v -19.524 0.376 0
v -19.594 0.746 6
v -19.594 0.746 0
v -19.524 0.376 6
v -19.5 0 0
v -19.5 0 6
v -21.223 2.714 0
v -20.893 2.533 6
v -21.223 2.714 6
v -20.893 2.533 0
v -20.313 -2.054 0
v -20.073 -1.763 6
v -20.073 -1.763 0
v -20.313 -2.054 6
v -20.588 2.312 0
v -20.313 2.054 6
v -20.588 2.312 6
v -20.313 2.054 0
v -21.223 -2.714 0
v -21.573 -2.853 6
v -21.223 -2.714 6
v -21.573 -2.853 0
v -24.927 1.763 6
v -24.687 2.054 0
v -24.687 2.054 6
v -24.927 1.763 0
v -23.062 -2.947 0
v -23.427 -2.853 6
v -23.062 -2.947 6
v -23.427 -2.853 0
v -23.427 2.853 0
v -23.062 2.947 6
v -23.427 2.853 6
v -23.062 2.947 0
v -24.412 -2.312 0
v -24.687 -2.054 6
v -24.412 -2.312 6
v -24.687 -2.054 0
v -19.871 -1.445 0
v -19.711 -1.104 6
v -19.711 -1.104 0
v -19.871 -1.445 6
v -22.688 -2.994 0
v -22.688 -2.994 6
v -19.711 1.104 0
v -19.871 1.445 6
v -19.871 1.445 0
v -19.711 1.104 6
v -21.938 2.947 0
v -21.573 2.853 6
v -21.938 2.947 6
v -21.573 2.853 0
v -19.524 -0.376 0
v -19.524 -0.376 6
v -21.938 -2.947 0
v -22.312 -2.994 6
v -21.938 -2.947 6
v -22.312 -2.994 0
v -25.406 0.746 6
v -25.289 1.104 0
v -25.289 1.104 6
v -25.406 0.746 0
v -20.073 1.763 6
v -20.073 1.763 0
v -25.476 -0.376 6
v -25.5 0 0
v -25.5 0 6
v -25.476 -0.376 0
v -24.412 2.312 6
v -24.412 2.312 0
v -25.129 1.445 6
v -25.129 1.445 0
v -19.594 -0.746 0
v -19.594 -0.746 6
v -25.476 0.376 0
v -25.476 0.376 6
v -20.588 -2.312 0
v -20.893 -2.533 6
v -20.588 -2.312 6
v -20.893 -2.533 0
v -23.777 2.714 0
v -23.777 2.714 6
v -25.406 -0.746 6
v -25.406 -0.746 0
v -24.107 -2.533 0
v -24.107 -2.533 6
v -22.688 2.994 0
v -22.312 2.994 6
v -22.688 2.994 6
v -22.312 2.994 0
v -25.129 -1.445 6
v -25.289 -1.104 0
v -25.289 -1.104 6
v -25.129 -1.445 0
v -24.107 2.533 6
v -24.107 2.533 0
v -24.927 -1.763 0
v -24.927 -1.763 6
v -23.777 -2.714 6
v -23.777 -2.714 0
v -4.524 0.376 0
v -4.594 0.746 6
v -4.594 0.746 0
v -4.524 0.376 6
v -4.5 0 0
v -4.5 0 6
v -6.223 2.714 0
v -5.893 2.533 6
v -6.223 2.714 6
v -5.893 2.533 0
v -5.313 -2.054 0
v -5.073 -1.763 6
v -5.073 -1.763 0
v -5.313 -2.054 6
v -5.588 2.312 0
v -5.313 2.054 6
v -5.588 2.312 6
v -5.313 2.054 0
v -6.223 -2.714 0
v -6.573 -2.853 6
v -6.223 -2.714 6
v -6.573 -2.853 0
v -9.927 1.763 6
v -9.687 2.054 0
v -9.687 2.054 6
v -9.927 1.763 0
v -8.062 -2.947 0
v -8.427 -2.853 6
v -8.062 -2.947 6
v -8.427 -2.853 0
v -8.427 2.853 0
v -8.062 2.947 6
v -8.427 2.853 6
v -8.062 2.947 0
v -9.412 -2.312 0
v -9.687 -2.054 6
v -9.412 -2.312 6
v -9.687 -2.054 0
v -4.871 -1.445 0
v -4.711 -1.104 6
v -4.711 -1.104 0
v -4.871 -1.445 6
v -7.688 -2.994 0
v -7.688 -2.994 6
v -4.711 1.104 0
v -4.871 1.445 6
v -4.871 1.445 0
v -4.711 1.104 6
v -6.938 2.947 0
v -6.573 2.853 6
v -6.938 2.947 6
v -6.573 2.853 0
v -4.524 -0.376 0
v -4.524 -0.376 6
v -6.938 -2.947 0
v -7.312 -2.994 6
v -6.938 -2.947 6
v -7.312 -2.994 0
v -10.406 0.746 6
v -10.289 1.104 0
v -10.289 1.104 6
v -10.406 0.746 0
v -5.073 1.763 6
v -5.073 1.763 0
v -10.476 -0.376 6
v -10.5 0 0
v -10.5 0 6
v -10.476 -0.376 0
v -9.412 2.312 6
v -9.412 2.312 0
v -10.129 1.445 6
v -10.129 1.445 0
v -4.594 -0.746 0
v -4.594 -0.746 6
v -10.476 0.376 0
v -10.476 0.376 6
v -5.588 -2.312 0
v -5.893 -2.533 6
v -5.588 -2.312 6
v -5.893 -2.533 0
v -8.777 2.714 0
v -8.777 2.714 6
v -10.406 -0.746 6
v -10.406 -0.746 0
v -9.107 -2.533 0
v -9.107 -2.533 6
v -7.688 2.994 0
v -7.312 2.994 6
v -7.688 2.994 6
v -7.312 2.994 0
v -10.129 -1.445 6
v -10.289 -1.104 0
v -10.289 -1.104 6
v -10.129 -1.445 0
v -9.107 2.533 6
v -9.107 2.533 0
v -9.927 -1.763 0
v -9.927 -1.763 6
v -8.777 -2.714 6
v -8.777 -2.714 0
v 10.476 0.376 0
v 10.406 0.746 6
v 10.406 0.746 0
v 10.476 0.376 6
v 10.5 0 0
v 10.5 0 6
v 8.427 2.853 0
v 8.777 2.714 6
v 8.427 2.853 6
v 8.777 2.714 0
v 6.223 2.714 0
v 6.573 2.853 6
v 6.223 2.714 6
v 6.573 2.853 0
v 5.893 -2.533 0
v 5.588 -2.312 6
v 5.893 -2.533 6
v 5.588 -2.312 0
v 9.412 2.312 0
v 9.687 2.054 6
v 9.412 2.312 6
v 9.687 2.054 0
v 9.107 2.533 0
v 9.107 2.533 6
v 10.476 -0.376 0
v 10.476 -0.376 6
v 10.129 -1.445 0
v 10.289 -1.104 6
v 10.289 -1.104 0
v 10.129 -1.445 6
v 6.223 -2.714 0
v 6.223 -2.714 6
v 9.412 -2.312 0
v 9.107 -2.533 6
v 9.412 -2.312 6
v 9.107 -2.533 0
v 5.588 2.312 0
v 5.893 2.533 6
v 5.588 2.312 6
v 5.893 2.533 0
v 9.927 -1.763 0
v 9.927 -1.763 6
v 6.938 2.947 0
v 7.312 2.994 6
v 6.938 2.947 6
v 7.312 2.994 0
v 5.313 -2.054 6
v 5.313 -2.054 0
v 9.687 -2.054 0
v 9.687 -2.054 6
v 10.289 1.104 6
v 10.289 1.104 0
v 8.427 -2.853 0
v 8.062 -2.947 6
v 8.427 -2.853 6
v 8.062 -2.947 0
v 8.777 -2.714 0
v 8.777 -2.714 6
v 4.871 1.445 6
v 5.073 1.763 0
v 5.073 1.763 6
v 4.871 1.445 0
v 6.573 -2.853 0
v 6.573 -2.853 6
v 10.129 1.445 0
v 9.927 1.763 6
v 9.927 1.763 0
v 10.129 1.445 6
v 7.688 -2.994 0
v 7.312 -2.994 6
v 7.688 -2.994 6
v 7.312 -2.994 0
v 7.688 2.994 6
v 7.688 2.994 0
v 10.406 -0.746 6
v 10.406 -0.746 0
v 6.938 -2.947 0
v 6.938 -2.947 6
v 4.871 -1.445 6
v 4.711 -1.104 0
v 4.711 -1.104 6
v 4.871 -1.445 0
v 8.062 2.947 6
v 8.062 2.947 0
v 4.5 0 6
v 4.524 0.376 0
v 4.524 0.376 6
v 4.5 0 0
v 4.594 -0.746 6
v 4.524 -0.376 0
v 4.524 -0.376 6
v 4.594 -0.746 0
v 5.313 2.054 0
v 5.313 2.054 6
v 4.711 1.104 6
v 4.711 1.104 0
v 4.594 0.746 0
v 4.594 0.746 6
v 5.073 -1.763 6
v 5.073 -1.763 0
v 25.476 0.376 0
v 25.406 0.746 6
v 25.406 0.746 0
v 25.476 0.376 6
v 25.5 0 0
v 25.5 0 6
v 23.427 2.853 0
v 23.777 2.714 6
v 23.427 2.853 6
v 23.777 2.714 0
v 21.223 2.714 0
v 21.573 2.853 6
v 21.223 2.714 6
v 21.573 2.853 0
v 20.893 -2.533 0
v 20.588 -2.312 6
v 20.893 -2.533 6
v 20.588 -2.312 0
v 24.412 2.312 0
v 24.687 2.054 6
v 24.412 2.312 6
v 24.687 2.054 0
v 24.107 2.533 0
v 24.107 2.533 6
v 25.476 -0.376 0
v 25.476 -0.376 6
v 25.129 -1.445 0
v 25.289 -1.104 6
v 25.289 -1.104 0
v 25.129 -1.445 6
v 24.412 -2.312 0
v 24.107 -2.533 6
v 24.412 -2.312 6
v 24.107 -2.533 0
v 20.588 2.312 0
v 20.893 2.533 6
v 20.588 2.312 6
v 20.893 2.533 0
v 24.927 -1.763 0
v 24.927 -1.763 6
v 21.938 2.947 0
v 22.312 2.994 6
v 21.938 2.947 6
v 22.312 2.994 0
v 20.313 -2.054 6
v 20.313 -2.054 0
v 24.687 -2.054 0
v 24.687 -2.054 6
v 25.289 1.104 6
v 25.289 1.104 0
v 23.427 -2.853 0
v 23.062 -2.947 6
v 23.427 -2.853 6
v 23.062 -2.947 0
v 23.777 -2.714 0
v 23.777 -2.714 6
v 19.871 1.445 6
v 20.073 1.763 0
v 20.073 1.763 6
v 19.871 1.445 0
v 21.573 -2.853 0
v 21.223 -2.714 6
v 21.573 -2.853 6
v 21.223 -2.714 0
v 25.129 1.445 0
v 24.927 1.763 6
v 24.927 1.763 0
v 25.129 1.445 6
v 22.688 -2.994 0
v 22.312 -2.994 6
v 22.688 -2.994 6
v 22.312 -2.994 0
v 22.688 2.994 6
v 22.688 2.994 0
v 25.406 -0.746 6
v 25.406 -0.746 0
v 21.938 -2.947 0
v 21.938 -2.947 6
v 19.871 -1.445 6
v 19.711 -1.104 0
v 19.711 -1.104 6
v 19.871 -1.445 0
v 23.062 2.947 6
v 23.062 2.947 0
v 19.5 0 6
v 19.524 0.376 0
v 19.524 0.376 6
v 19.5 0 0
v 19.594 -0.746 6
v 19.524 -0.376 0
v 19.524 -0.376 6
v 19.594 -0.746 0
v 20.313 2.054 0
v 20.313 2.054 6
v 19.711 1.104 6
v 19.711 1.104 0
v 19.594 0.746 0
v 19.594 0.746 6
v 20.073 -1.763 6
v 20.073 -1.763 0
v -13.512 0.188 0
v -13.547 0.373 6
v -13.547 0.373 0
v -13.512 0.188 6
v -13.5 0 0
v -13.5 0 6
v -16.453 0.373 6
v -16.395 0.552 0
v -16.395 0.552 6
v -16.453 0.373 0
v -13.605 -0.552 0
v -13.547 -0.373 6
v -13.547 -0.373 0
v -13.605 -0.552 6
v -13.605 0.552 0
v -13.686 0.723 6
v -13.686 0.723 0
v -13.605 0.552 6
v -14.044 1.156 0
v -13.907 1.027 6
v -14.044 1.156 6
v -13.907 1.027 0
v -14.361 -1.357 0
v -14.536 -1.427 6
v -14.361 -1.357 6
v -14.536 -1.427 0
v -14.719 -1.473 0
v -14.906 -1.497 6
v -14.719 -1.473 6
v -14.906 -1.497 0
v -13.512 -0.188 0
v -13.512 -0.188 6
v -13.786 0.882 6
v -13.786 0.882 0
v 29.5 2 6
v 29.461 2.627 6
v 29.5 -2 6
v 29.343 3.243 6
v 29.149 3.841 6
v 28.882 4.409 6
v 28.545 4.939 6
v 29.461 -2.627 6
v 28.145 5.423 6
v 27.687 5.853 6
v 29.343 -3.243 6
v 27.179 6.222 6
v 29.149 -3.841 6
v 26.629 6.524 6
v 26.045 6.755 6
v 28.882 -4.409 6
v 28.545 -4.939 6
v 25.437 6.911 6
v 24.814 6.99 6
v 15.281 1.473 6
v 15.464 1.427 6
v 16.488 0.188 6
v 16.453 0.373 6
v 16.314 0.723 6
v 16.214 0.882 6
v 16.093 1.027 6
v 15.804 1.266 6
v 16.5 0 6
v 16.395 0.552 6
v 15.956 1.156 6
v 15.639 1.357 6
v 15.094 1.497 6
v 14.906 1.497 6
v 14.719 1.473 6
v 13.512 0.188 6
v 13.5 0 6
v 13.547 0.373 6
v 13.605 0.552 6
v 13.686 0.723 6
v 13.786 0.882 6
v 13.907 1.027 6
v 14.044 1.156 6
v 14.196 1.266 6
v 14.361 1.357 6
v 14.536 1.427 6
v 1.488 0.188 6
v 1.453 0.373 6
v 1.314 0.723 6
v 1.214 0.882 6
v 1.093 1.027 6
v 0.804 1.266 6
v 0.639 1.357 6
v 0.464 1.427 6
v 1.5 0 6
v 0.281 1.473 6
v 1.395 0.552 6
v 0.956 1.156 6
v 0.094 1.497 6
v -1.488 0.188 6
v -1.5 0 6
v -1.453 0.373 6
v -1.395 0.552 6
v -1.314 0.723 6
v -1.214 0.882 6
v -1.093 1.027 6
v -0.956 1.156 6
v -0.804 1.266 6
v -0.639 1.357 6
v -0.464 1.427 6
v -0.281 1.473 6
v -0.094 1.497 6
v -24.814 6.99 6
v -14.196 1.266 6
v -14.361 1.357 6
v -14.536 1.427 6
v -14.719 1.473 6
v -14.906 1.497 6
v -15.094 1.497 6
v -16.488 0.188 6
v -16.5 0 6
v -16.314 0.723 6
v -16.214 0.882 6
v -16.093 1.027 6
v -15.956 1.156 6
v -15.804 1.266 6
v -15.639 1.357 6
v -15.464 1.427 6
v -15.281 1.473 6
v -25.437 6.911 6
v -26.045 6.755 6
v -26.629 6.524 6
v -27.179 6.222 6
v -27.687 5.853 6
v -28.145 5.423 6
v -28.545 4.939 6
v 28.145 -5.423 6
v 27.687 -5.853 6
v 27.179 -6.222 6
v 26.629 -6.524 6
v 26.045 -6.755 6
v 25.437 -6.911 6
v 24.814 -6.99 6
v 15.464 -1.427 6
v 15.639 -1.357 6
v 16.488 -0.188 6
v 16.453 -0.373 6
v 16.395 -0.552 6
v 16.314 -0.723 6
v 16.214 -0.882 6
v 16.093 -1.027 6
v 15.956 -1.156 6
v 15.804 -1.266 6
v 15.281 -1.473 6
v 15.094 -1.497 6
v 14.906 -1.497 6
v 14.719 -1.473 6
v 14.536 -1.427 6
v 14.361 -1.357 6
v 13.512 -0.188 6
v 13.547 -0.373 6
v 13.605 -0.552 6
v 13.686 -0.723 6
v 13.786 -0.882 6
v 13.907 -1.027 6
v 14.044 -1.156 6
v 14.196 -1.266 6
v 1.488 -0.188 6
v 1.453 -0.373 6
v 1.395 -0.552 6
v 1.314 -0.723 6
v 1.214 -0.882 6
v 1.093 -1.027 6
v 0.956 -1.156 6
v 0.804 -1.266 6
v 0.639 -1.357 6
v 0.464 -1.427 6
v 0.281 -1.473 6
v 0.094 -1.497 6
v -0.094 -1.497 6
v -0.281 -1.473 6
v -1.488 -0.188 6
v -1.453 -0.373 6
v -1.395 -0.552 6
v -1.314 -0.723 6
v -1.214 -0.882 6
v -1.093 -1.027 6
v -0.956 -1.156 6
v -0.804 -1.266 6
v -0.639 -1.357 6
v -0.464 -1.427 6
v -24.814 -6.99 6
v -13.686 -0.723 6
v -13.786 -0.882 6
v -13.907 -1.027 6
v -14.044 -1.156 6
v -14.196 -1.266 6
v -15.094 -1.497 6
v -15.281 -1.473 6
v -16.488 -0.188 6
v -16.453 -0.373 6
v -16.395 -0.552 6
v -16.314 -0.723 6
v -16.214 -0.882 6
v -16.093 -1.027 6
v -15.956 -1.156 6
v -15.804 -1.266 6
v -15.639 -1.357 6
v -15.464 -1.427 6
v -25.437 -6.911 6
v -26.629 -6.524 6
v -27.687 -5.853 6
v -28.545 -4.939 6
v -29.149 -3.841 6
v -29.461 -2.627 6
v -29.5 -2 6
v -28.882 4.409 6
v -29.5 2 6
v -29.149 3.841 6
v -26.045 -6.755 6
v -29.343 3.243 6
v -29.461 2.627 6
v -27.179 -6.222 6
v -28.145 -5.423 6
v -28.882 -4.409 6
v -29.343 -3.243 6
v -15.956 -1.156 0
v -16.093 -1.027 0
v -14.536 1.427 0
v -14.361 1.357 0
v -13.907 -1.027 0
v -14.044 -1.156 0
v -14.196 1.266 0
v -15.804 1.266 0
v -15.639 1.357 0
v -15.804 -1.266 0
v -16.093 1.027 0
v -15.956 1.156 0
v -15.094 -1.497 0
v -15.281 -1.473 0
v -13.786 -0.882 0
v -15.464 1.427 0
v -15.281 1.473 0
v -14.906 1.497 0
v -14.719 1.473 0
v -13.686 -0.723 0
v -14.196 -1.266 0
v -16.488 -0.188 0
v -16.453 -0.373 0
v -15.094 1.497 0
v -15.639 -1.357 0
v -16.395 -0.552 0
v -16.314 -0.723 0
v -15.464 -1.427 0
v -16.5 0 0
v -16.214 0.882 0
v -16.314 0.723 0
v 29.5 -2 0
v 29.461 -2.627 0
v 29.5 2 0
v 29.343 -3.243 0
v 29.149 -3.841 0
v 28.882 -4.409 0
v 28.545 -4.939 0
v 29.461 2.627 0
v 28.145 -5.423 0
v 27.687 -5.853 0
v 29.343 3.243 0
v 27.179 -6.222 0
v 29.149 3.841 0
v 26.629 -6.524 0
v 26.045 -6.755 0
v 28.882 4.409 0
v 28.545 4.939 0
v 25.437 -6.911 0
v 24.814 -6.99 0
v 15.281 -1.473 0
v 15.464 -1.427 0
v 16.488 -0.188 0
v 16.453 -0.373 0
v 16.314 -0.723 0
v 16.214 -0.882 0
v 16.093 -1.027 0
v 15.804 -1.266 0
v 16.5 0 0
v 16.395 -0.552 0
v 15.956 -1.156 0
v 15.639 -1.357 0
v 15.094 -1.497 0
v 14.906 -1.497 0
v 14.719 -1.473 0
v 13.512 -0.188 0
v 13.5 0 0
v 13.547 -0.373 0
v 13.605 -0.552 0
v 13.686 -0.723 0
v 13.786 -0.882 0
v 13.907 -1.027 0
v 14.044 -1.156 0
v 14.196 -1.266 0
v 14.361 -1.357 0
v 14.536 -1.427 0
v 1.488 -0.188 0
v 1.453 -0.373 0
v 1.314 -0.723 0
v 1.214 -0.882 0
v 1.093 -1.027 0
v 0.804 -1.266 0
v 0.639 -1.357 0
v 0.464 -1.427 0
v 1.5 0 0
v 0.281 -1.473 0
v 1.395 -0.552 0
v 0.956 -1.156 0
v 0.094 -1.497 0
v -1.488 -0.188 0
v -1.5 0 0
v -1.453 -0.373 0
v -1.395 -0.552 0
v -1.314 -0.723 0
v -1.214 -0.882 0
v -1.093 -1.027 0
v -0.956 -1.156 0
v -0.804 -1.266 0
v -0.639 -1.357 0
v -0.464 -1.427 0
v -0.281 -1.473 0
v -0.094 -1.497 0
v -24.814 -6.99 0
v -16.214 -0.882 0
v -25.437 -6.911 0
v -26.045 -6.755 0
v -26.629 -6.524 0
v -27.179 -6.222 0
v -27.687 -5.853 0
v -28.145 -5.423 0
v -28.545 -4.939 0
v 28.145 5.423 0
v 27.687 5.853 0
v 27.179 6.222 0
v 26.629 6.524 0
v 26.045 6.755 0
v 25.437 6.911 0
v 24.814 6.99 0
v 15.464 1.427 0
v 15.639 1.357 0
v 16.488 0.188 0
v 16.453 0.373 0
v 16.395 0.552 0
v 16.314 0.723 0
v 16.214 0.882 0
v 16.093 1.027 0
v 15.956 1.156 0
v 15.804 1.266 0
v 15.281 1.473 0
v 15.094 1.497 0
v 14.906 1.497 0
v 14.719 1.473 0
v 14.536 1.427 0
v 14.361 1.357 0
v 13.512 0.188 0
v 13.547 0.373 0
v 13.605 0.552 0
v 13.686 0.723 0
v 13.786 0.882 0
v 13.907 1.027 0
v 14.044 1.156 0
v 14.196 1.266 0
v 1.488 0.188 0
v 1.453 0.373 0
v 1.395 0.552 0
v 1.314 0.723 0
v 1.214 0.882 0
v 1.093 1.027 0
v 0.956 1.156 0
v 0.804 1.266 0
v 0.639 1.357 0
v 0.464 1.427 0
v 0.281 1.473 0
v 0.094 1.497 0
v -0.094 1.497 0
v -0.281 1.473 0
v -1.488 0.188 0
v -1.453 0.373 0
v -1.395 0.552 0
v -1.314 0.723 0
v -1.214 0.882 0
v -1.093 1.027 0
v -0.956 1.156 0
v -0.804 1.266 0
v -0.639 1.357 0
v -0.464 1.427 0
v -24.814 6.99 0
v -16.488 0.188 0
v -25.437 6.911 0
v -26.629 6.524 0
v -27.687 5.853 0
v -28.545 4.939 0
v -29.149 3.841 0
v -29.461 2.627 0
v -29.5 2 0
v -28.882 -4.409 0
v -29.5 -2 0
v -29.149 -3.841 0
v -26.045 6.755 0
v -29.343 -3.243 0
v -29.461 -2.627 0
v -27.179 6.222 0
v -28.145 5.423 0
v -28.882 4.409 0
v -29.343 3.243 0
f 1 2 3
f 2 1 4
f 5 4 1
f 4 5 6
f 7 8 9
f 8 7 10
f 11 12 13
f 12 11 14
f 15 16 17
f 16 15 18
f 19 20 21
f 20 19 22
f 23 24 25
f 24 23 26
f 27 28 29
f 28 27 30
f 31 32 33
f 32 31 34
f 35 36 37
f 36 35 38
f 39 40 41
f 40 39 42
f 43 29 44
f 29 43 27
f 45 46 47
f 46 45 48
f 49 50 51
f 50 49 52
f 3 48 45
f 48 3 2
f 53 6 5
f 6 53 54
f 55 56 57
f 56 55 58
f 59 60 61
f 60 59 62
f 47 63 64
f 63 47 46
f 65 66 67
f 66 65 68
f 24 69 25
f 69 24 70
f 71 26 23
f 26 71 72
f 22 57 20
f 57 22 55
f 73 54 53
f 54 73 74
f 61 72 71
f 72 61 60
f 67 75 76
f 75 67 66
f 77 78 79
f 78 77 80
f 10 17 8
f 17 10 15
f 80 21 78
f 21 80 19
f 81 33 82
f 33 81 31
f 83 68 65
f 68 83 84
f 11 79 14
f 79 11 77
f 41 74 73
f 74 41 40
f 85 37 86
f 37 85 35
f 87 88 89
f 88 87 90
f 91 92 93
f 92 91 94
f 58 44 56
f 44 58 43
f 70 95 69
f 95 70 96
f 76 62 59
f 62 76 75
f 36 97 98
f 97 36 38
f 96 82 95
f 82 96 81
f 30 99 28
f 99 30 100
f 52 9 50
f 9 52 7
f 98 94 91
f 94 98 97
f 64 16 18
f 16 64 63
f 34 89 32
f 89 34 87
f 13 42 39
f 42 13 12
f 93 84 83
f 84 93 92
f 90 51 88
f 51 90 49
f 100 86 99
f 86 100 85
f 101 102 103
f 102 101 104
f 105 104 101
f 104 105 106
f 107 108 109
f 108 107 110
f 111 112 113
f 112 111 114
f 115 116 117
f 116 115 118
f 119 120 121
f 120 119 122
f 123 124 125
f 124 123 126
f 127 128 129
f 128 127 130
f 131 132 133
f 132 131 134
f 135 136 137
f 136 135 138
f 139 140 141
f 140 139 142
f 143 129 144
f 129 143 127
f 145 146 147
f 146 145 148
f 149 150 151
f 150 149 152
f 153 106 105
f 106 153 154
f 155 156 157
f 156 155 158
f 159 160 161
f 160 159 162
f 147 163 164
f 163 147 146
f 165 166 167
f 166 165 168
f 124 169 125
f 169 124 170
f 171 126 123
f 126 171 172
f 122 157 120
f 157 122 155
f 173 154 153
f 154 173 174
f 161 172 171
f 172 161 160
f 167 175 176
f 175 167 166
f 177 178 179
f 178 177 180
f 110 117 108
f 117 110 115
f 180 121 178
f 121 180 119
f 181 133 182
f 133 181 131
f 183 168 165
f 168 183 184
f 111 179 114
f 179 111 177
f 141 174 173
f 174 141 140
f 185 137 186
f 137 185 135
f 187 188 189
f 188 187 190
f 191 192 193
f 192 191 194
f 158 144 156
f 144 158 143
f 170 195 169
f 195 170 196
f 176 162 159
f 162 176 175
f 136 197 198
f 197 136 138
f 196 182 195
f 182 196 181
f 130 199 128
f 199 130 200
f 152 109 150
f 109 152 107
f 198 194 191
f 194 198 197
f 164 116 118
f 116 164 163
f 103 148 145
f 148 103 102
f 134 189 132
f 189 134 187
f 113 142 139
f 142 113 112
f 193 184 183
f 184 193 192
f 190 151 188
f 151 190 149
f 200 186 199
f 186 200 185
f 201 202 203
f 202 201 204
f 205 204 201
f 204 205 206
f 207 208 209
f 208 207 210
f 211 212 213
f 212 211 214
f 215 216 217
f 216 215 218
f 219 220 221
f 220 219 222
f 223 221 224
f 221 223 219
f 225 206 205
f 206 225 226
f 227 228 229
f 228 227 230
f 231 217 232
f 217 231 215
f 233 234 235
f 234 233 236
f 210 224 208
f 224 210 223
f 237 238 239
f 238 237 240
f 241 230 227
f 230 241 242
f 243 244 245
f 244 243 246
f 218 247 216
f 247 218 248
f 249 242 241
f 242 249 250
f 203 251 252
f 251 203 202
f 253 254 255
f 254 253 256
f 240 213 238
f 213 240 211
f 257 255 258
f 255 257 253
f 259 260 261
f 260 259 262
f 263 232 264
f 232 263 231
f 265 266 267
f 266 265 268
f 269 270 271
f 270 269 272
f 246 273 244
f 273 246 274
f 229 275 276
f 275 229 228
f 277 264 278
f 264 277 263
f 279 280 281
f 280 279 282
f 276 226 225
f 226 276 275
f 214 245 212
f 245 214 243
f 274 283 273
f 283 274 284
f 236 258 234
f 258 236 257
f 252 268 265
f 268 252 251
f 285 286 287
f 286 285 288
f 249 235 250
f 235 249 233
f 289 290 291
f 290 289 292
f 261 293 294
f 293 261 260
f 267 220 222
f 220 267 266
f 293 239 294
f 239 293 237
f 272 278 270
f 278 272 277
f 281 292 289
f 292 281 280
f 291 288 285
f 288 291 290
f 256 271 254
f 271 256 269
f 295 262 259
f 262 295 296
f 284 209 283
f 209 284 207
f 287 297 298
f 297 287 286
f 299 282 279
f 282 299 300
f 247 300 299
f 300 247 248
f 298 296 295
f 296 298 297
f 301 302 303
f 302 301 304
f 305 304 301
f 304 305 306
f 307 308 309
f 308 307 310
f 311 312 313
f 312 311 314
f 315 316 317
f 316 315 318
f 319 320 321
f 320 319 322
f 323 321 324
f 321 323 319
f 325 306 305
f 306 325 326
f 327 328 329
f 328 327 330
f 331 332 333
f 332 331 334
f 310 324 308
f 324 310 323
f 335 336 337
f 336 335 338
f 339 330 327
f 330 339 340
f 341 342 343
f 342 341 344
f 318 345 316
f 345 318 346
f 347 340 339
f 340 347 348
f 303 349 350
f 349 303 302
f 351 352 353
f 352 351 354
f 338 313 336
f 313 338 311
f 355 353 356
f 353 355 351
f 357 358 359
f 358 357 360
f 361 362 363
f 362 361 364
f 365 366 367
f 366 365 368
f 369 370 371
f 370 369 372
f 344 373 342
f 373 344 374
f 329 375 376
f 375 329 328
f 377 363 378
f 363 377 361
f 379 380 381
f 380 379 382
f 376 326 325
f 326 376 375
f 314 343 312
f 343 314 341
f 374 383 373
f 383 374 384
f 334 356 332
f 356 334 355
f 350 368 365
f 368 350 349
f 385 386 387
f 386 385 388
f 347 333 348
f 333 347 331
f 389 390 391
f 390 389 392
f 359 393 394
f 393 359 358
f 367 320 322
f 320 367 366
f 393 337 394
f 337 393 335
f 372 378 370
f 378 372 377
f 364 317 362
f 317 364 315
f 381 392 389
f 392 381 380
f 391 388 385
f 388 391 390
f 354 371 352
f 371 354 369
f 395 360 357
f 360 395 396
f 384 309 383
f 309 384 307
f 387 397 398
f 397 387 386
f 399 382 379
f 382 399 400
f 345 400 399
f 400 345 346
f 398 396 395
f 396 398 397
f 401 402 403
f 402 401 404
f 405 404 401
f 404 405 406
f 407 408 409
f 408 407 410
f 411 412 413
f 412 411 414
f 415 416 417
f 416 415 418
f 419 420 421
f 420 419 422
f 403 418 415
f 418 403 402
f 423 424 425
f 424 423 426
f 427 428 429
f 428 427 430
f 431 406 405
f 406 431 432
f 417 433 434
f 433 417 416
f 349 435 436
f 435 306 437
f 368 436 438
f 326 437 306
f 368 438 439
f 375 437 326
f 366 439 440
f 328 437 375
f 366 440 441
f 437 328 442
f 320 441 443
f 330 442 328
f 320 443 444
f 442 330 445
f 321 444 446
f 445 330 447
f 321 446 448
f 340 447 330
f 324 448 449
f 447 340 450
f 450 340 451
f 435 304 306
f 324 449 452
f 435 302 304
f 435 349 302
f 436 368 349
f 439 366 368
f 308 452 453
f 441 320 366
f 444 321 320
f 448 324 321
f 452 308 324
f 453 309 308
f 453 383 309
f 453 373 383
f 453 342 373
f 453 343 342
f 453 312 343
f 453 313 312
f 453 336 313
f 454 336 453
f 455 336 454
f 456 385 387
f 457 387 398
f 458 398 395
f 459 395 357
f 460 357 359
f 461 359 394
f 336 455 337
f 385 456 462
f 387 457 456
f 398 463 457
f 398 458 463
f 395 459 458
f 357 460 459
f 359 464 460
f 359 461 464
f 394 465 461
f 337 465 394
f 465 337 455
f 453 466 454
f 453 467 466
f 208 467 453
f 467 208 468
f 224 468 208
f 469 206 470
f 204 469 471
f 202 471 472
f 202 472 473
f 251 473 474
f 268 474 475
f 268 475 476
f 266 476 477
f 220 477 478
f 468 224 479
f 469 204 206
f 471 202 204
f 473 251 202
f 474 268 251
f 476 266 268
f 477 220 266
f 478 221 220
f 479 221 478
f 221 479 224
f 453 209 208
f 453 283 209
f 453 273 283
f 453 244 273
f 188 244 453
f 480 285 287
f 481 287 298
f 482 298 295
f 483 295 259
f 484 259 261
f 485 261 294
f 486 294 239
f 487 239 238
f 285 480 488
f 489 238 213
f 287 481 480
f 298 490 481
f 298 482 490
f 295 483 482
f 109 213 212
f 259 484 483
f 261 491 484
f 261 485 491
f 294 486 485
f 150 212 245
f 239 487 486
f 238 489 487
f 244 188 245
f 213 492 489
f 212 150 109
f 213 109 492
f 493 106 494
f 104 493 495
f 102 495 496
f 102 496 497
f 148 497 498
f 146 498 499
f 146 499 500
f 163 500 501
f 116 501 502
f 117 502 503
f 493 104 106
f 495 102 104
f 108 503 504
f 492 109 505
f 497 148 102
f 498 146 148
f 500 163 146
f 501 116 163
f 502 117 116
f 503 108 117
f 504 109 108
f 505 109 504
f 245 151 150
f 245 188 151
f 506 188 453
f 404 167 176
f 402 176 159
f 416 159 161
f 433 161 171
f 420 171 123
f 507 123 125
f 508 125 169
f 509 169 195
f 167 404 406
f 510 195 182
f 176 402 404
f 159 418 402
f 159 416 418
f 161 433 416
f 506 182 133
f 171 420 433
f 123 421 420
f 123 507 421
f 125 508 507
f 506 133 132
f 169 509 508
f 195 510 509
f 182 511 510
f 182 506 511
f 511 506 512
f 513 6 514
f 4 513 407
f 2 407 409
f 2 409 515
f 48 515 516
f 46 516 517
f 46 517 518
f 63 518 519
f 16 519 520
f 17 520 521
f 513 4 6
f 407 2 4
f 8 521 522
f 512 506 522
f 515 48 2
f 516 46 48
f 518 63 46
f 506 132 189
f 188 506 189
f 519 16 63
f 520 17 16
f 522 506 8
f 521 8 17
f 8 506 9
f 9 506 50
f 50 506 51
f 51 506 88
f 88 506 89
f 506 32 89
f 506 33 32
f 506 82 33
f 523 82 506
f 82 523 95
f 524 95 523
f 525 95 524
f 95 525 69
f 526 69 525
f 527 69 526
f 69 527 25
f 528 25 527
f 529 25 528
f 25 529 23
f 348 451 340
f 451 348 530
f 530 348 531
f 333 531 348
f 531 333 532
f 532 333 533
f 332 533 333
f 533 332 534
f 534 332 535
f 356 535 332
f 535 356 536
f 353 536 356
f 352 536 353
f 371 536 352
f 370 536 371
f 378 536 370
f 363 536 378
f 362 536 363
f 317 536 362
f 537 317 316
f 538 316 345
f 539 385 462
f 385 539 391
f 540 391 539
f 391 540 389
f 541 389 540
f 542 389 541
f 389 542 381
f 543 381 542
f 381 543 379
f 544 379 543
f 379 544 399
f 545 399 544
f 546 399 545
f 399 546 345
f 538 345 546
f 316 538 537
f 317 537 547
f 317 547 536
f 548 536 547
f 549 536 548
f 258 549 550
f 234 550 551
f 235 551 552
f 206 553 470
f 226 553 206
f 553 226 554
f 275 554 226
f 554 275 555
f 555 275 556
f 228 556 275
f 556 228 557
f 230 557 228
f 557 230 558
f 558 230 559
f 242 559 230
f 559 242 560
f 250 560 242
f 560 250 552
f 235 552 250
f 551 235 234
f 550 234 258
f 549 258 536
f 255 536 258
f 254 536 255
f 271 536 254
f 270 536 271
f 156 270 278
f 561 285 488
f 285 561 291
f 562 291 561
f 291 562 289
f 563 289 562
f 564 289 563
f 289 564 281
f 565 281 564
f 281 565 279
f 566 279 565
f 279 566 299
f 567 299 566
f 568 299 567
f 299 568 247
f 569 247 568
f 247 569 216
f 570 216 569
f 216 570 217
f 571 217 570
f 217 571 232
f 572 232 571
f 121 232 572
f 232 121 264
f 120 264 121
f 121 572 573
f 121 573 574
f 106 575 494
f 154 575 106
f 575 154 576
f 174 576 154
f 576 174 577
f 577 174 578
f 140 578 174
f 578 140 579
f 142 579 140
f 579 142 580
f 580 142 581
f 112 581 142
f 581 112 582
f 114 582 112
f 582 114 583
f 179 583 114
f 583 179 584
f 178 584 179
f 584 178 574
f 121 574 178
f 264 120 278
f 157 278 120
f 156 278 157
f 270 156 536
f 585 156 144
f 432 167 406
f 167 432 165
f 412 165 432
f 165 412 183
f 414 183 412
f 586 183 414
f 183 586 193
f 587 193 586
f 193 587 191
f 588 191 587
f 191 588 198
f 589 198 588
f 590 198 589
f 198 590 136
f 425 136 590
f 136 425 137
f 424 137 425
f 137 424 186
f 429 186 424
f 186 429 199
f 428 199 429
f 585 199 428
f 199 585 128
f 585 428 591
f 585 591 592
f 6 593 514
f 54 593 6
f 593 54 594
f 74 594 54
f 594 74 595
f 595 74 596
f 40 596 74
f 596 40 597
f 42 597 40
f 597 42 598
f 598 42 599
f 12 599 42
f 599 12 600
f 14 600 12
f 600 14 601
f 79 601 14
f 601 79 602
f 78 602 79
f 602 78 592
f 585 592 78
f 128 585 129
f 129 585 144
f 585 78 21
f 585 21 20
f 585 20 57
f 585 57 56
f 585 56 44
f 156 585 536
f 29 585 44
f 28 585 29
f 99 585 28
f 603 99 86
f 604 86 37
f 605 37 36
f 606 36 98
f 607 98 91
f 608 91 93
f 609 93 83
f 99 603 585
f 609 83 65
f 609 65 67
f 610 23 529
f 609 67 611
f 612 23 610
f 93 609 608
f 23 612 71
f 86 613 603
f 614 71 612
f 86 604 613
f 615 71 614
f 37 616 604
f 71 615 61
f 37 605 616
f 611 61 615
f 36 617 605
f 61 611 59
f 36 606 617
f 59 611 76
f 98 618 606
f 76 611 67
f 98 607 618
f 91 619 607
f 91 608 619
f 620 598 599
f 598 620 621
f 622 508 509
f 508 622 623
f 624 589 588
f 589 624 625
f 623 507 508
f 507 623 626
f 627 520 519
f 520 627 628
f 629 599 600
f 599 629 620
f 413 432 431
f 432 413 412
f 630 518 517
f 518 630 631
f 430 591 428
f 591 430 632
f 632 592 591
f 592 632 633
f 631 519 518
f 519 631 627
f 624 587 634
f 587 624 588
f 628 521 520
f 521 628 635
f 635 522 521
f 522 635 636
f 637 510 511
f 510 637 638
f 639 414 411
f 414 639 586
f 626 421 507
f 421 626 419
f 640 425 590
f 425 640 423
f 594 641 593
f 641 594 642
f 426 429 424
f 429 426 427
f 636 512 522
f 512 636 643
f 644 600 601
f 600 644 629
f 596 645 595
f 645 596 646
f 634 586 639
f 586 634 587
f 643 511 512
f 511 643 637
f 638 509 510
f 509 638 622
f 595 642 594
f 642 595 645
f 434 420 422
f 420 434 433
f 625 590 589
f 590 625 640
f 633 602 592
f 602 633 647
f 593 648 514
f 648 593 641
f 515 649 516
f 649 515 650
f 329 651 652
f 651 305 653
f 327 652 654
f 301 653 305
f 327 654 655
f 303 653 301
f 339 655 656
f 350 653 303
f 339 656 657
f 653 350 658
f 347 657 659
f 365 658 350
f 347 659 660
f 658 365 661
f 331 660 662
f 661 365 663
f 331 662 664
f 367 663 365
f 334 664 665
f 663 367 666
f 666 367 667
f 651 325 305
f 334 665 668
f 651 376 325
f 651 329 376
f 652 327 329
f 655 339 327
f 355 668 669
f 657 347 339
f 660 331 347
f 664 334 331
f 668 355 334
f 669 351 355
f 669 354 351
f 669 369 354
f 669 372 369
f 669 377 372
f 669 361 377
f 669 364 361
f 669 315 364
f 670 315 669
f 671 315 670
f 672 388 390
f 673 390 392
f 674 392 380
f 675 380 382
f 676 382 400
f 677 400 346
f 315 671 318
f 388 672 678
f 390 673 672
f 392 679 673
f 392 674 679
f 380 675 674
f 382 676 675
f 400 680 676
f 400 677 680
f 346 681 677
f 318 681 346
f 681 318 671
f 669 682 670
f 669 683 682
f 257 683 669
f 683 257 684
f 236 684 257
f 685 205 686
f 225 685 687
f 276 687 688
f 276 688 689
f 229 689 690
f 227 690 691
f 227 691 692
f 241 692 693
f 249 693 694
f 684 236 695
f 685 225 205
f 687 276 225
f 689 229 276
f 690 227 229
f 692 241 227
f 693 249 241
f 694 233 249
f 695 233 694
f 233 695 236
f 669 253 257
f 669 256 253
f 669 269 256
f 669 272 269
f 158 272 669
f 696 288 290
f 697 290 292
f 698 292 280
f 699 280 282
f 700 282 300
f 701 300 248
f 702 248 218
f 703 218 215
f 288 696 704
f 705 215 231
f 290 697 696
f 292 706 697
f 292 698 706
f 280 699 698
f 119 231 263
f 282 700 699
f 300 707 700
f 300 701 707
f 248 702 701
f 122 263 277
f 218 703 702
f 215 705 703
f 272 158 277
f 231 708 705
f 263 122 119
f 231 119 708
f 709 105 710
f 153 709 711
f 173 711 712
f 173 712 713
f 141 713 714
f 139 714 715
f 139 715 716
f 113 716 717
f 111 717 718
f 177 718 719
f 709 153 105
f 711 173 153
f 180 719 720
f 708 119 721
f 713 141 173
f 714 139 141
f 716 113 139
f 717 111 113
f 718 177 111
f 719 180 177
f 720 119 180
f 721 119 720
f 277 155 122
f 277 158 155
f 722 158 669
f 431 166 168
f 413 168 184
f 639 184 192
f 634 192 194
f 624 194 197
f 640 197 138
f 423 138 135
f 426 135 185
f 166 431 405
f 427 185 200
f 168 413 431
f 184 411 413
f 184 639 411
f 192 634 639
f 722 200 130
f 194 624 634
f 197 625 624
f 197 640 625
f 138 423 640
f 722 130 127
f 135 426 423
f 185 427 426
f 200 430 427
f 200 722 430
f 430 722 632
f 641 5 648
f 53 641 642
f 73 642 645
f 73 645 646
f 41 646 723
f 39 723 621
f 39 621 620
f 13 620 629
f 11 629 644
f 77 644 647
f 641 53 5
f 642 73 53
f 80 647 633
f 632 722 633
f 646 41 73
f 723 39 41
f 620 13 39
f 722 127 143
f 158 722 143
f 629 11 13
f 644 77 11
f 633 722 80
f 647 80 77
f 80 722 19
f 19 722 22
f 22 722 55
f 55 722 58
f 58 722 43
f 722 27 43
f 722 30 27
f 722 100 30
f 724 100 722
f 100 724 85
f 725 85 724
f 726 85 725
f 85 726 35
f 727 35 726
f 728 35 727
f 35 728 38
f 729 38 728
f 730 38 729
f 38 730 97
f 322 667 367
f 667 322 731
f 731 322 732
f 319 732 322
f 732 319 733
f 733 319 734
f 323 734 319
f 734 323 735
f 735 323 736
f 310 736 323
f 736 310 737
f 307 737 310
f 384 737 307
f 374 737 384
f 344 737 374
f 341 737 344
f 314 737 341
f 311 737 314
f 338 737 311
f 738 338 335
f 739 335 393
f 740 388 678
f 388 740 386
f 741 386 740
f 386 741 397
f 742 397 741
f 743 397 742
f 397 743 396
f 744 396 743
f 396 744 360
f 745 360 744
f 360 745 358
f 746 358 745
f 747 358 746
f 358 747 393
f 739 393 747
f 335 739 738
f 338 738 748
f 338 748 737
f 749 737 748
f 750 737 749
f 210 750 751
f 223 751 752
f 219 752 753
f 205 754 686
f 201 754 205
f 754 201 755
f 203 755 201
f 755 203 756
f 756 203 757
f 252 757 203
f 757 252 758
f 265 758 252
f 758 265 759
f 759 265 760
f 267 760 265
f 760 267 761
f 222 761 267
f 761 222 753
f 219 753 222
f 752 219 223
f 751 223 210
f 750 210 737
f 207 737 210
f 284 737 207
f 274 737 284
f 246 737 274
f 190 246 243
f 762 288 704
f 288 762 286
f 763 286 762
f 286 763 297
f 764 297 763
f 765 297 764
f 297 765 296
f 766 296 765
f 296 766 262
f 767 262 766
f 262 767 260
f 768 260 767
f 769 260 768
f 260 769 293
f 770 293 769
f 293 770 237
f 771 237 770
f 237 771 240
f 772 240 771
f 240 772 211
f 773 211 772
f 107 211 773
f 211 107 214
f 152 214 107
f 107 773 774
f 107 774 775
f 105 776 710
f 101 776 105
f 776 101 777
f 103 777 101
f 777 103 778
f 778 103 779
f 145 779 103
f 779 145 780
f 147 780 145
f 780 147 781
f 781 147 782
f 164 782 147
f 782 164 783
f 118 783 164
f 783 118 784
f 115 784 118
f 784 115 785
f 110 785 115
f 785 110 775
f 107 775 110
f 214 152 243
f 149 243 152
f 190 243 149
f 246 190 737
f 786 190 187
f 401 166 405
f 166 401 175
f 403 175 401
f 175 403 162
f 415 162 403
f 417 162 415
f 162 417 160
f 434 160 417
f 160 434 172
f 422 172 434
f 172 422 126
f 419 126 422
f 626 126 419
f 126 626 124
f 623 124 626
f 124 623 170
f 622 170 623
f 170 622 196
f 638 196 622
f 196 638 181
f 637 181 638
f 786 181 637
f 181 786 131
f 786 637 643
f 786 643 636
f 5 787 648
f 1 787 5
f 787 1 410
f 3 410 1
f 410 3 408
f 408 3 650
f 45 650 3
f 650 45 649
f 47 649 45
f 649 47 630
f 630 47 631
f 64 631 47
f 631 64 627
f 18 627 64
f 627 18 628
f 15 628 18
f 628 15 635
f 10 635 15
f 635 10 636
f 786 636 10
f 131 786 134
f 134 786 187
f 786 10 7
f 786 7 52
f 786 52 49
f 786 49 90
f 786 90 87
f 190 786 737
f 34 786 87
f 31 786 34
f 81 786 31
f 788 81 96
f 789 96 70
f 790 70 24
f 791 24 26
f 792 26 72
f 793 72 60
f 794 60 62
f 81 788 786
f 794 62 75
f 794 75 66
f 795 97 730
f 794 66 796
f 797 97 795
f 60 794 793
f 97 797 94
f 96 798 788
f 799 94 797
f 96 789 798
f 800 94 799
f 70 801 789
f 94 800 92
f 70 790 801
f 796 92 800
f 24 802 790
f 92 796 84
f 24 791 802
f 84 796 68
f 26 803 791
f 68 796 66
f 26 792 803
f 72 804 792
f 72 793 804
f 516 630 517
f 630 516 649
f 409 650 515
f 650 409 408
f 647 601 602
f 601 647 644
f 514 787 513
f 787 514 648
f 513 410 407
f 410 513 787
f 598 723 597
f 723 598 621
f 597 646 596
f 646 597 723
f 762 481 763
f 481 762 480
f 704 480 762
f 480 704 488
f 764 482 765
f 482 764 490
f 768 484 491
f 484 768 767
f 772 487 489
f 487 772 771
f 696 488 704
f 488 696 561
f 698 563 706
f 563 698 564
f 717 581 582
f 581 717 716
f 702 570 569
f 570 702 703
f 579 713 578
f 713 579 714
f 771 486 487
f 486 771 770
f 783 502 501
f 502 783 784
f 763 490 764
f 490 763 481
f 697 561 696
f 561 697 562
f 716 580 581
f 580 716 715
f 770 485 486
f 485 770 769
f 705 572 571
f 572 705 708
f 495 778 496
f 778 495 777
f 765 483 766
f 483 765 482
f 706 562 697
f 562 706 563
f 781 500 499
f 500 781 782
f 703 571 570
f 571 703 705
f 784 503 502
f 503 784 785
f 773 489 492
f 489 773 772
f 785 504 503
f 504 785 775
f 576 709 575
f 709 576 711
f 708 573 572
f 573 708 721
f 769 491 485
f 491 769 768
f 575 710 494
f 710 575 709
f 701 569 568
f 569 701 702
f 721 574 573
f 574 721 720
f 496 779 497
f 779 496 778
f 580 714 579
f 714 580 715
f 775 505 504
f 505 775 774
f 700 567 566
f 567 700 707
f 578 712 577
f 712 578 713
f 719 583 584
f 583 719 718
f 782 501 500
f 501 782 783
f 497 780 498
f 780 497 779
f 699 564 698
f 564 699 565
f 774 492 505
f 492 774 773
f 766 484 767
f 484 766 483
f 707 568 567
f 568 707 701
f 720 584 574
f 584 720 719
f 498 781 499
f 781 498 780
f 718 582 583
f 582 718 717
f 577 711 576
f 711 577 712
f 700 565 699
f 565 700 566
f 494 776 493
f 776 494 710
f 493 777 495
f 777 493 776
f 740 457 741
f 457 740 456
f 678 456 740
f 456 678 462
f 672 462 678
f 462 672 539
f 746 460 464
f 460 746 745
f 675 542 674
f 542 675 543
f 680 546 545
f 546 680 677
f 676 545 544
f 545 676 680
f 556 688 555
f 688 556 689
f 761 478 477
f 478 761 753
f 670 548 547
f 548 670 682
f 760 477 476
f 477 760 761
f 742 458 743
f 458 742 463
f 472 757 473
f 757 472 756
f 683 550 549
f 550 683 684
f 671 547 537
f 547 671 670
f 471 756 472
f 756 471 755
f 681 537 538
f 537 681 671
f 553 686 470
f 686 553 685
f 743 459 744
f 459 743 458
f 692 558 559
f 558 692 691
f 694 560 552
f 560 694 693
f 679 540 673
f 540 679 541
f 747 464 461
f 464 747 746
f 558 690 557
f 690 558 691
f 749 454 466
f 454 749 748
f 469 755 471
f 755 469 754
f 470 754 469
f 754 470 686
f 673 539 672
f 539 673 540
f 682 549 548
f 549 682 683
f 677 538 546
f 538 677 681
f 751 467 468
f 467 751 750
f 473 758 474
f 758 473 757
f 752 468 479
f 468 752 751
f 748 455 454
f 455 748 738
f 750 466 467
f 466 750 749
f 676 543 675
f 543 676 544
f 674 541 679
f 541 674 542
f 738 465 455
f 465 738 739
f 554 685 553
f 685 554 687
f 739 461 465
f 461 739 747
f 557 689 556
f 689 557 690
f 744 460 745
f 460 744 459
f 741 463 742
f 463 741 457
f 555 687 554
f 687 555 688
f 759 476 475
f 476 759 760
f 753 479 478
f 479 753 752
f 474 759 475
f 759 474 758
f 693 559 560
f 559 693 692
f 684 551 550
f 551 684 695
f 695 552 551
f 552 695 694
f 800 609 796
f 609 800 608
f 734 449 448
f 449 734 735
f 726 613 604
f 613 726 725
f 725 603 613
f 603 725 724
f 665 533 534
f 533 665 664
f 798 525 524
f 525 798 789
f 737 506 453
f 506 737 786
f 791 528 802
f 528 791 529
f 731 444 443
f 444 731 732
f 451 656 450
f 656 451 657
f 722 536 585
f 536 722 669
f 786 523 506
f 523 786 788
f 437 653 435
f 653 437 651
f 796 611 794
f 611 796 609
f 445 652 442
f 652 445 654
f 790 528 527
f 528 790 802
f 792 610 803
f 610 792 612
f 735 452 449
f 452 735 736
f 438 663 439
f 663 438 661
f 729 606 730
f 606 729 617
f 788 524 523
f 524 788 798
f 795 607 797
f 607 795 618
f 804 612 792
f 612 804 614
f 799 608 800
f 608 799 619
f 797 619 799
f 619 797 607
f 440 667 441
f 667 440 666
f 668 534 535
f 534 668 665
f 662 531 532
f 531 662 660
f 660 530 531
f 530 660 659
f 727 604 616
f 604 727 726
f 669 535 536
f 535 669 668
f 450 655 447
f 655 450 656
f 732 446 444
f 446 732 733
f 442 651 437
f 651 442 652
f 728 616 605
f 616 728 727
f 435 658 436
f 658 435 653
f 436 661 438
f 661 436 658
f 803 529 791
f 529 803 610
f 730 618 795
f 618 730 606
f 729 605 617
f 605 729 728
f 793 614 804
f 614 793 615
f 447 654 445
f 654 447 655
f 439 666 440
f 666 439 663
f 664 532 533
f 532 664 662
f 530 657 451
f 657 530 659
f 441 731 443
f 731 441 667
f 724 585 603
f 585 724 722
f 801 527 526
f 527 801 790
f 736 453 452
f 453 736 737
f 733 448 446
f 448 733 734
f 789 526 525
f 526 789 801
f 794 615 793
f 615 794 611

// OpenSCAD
$fn = 50;


difference() {
	union() {
		hull() {
			translate(v = [-24.5000000000, 2.0000000000, 0]) {
				cylinder(h = 6, r = 5);
			}
			translate(v = [24.5000000000, 2.0000000000, 0]) {
				cylinder(h = 6, r = 5);
			}
			translate(v = [-24.5000000000, -2.0000000000, 0]) {
				cylinder(h = 6, r = 5);
			}
			translate(v = [24.5000000000, -2.0000000000, 0]) {
				cylinder(h = 6, r = 5);
			}
		}
	}
	union() {
		translate(v = [-22.5000000000, 0.0000000000, -100.0000000000]) {
			cylinder(h = 200, r = 3.0000000000);
		}
		translate(v = [-7.5000000000, 0.0000000000, -100.0000000000]) {
			cylinder(h = 200, r = 3.0000000000);
		}
		translate(v = [7.5000000000, 0.0000000000, -100.0000000000]) {
			cylinder(h = 200, r = 3.0000000000);
		}
		translate(v = [22.5000000000, 0.0000000000, -100.0000000000]) {
			cylinder(h = 200, r = 3.0000000000);
		}
		translate(v = [-22.5000000000, 0.0000000000, 0]) {
			cylinder(h = 6, r = 1.5000000000);
		}
		translate(v = [-15.0000000000, 0.0000000000, 0]) {
			cylinder(h = 6, r = 1.5000000000);
		}
		translate(v = [-7.5000000000, 0.0000000000, 0]) {
			cylinder(h = 6, r = 1.5000000000);
		}
		cylinder(h = 6, r = 1.5000000000);
		translate(v = [7.5000000000, 0.0000000000, 0]) {
			cylinder(h = 6, r = 1.5000000000);
		}
		translate(v = [15.0000000000, 0.0000000000, 0]) {
			cylinder(h = 6, r = 1.5000000000);
		}
		translate(v = [22.5000000000, 0.0000000000, 0]) {
			cylinder(h = 6, r = 1.5000000000);
		}
		translate(v = [-22.5000000000, 0.0000000000, 0]) {
			cylinder(h = 6, r = 1.5000000000);
		}
		translate(v = [-15.0000000000, 0.0000000000, 0]) {
			cylinder(h = 6, r = 1.5000000000);
		}
		translate(v = [-7.5000000000, 0.0000000000, 0]) {
			cylinder(h = 6, r = 1.5000000000);
		}
		cylinder(h = 6, r = 1.5000000000);
		translate(v = [7.5000000000, 0.0000000000, 0]) {
			cylinder(h = 6, r = 1.5000000000);
		}
		translate(v = [15.0000000000, 0.0000000000, 0]) {
			cylinder(h = 6, r = 1.5000000000);
		}
		translate(v = [22.5000000000, 0.0000000000, 0]) {
			cylinder(h = 6, r = 1.5000000000);
		}
		translate(v = [-22.5000000000, 0.0000000000, 0]) {
			cylinder(h = 6, r = 1.5000000000);
		}
		translate(v = [-15.0000000000, 0.0000000000, 0]) {
			cylinder(h = 6, r = 1.5000000000);
		}
		translate(v = [-7.5000000000, 0.0000000000, 0]) {
			cylinder(h = 6, r = 1.5000000000);
		}
		cylinder(h = 6, r = 1.5000000000);
		translate(v = [7.5000000000, 0.0000000000, 0]) {
			cylinder(h = 6, r = 1.5000000000);
		}
		translate(v = [15.0000000000, 0.0000000000, 0]) {
			cylinder(h = 6, r = 1.5000000000);
		}
		translate(v = [22.5000000000, 0.0000000000, 0]) {
			cylinder(h = 6, r = 1.5000000000);
		}
	}
}
